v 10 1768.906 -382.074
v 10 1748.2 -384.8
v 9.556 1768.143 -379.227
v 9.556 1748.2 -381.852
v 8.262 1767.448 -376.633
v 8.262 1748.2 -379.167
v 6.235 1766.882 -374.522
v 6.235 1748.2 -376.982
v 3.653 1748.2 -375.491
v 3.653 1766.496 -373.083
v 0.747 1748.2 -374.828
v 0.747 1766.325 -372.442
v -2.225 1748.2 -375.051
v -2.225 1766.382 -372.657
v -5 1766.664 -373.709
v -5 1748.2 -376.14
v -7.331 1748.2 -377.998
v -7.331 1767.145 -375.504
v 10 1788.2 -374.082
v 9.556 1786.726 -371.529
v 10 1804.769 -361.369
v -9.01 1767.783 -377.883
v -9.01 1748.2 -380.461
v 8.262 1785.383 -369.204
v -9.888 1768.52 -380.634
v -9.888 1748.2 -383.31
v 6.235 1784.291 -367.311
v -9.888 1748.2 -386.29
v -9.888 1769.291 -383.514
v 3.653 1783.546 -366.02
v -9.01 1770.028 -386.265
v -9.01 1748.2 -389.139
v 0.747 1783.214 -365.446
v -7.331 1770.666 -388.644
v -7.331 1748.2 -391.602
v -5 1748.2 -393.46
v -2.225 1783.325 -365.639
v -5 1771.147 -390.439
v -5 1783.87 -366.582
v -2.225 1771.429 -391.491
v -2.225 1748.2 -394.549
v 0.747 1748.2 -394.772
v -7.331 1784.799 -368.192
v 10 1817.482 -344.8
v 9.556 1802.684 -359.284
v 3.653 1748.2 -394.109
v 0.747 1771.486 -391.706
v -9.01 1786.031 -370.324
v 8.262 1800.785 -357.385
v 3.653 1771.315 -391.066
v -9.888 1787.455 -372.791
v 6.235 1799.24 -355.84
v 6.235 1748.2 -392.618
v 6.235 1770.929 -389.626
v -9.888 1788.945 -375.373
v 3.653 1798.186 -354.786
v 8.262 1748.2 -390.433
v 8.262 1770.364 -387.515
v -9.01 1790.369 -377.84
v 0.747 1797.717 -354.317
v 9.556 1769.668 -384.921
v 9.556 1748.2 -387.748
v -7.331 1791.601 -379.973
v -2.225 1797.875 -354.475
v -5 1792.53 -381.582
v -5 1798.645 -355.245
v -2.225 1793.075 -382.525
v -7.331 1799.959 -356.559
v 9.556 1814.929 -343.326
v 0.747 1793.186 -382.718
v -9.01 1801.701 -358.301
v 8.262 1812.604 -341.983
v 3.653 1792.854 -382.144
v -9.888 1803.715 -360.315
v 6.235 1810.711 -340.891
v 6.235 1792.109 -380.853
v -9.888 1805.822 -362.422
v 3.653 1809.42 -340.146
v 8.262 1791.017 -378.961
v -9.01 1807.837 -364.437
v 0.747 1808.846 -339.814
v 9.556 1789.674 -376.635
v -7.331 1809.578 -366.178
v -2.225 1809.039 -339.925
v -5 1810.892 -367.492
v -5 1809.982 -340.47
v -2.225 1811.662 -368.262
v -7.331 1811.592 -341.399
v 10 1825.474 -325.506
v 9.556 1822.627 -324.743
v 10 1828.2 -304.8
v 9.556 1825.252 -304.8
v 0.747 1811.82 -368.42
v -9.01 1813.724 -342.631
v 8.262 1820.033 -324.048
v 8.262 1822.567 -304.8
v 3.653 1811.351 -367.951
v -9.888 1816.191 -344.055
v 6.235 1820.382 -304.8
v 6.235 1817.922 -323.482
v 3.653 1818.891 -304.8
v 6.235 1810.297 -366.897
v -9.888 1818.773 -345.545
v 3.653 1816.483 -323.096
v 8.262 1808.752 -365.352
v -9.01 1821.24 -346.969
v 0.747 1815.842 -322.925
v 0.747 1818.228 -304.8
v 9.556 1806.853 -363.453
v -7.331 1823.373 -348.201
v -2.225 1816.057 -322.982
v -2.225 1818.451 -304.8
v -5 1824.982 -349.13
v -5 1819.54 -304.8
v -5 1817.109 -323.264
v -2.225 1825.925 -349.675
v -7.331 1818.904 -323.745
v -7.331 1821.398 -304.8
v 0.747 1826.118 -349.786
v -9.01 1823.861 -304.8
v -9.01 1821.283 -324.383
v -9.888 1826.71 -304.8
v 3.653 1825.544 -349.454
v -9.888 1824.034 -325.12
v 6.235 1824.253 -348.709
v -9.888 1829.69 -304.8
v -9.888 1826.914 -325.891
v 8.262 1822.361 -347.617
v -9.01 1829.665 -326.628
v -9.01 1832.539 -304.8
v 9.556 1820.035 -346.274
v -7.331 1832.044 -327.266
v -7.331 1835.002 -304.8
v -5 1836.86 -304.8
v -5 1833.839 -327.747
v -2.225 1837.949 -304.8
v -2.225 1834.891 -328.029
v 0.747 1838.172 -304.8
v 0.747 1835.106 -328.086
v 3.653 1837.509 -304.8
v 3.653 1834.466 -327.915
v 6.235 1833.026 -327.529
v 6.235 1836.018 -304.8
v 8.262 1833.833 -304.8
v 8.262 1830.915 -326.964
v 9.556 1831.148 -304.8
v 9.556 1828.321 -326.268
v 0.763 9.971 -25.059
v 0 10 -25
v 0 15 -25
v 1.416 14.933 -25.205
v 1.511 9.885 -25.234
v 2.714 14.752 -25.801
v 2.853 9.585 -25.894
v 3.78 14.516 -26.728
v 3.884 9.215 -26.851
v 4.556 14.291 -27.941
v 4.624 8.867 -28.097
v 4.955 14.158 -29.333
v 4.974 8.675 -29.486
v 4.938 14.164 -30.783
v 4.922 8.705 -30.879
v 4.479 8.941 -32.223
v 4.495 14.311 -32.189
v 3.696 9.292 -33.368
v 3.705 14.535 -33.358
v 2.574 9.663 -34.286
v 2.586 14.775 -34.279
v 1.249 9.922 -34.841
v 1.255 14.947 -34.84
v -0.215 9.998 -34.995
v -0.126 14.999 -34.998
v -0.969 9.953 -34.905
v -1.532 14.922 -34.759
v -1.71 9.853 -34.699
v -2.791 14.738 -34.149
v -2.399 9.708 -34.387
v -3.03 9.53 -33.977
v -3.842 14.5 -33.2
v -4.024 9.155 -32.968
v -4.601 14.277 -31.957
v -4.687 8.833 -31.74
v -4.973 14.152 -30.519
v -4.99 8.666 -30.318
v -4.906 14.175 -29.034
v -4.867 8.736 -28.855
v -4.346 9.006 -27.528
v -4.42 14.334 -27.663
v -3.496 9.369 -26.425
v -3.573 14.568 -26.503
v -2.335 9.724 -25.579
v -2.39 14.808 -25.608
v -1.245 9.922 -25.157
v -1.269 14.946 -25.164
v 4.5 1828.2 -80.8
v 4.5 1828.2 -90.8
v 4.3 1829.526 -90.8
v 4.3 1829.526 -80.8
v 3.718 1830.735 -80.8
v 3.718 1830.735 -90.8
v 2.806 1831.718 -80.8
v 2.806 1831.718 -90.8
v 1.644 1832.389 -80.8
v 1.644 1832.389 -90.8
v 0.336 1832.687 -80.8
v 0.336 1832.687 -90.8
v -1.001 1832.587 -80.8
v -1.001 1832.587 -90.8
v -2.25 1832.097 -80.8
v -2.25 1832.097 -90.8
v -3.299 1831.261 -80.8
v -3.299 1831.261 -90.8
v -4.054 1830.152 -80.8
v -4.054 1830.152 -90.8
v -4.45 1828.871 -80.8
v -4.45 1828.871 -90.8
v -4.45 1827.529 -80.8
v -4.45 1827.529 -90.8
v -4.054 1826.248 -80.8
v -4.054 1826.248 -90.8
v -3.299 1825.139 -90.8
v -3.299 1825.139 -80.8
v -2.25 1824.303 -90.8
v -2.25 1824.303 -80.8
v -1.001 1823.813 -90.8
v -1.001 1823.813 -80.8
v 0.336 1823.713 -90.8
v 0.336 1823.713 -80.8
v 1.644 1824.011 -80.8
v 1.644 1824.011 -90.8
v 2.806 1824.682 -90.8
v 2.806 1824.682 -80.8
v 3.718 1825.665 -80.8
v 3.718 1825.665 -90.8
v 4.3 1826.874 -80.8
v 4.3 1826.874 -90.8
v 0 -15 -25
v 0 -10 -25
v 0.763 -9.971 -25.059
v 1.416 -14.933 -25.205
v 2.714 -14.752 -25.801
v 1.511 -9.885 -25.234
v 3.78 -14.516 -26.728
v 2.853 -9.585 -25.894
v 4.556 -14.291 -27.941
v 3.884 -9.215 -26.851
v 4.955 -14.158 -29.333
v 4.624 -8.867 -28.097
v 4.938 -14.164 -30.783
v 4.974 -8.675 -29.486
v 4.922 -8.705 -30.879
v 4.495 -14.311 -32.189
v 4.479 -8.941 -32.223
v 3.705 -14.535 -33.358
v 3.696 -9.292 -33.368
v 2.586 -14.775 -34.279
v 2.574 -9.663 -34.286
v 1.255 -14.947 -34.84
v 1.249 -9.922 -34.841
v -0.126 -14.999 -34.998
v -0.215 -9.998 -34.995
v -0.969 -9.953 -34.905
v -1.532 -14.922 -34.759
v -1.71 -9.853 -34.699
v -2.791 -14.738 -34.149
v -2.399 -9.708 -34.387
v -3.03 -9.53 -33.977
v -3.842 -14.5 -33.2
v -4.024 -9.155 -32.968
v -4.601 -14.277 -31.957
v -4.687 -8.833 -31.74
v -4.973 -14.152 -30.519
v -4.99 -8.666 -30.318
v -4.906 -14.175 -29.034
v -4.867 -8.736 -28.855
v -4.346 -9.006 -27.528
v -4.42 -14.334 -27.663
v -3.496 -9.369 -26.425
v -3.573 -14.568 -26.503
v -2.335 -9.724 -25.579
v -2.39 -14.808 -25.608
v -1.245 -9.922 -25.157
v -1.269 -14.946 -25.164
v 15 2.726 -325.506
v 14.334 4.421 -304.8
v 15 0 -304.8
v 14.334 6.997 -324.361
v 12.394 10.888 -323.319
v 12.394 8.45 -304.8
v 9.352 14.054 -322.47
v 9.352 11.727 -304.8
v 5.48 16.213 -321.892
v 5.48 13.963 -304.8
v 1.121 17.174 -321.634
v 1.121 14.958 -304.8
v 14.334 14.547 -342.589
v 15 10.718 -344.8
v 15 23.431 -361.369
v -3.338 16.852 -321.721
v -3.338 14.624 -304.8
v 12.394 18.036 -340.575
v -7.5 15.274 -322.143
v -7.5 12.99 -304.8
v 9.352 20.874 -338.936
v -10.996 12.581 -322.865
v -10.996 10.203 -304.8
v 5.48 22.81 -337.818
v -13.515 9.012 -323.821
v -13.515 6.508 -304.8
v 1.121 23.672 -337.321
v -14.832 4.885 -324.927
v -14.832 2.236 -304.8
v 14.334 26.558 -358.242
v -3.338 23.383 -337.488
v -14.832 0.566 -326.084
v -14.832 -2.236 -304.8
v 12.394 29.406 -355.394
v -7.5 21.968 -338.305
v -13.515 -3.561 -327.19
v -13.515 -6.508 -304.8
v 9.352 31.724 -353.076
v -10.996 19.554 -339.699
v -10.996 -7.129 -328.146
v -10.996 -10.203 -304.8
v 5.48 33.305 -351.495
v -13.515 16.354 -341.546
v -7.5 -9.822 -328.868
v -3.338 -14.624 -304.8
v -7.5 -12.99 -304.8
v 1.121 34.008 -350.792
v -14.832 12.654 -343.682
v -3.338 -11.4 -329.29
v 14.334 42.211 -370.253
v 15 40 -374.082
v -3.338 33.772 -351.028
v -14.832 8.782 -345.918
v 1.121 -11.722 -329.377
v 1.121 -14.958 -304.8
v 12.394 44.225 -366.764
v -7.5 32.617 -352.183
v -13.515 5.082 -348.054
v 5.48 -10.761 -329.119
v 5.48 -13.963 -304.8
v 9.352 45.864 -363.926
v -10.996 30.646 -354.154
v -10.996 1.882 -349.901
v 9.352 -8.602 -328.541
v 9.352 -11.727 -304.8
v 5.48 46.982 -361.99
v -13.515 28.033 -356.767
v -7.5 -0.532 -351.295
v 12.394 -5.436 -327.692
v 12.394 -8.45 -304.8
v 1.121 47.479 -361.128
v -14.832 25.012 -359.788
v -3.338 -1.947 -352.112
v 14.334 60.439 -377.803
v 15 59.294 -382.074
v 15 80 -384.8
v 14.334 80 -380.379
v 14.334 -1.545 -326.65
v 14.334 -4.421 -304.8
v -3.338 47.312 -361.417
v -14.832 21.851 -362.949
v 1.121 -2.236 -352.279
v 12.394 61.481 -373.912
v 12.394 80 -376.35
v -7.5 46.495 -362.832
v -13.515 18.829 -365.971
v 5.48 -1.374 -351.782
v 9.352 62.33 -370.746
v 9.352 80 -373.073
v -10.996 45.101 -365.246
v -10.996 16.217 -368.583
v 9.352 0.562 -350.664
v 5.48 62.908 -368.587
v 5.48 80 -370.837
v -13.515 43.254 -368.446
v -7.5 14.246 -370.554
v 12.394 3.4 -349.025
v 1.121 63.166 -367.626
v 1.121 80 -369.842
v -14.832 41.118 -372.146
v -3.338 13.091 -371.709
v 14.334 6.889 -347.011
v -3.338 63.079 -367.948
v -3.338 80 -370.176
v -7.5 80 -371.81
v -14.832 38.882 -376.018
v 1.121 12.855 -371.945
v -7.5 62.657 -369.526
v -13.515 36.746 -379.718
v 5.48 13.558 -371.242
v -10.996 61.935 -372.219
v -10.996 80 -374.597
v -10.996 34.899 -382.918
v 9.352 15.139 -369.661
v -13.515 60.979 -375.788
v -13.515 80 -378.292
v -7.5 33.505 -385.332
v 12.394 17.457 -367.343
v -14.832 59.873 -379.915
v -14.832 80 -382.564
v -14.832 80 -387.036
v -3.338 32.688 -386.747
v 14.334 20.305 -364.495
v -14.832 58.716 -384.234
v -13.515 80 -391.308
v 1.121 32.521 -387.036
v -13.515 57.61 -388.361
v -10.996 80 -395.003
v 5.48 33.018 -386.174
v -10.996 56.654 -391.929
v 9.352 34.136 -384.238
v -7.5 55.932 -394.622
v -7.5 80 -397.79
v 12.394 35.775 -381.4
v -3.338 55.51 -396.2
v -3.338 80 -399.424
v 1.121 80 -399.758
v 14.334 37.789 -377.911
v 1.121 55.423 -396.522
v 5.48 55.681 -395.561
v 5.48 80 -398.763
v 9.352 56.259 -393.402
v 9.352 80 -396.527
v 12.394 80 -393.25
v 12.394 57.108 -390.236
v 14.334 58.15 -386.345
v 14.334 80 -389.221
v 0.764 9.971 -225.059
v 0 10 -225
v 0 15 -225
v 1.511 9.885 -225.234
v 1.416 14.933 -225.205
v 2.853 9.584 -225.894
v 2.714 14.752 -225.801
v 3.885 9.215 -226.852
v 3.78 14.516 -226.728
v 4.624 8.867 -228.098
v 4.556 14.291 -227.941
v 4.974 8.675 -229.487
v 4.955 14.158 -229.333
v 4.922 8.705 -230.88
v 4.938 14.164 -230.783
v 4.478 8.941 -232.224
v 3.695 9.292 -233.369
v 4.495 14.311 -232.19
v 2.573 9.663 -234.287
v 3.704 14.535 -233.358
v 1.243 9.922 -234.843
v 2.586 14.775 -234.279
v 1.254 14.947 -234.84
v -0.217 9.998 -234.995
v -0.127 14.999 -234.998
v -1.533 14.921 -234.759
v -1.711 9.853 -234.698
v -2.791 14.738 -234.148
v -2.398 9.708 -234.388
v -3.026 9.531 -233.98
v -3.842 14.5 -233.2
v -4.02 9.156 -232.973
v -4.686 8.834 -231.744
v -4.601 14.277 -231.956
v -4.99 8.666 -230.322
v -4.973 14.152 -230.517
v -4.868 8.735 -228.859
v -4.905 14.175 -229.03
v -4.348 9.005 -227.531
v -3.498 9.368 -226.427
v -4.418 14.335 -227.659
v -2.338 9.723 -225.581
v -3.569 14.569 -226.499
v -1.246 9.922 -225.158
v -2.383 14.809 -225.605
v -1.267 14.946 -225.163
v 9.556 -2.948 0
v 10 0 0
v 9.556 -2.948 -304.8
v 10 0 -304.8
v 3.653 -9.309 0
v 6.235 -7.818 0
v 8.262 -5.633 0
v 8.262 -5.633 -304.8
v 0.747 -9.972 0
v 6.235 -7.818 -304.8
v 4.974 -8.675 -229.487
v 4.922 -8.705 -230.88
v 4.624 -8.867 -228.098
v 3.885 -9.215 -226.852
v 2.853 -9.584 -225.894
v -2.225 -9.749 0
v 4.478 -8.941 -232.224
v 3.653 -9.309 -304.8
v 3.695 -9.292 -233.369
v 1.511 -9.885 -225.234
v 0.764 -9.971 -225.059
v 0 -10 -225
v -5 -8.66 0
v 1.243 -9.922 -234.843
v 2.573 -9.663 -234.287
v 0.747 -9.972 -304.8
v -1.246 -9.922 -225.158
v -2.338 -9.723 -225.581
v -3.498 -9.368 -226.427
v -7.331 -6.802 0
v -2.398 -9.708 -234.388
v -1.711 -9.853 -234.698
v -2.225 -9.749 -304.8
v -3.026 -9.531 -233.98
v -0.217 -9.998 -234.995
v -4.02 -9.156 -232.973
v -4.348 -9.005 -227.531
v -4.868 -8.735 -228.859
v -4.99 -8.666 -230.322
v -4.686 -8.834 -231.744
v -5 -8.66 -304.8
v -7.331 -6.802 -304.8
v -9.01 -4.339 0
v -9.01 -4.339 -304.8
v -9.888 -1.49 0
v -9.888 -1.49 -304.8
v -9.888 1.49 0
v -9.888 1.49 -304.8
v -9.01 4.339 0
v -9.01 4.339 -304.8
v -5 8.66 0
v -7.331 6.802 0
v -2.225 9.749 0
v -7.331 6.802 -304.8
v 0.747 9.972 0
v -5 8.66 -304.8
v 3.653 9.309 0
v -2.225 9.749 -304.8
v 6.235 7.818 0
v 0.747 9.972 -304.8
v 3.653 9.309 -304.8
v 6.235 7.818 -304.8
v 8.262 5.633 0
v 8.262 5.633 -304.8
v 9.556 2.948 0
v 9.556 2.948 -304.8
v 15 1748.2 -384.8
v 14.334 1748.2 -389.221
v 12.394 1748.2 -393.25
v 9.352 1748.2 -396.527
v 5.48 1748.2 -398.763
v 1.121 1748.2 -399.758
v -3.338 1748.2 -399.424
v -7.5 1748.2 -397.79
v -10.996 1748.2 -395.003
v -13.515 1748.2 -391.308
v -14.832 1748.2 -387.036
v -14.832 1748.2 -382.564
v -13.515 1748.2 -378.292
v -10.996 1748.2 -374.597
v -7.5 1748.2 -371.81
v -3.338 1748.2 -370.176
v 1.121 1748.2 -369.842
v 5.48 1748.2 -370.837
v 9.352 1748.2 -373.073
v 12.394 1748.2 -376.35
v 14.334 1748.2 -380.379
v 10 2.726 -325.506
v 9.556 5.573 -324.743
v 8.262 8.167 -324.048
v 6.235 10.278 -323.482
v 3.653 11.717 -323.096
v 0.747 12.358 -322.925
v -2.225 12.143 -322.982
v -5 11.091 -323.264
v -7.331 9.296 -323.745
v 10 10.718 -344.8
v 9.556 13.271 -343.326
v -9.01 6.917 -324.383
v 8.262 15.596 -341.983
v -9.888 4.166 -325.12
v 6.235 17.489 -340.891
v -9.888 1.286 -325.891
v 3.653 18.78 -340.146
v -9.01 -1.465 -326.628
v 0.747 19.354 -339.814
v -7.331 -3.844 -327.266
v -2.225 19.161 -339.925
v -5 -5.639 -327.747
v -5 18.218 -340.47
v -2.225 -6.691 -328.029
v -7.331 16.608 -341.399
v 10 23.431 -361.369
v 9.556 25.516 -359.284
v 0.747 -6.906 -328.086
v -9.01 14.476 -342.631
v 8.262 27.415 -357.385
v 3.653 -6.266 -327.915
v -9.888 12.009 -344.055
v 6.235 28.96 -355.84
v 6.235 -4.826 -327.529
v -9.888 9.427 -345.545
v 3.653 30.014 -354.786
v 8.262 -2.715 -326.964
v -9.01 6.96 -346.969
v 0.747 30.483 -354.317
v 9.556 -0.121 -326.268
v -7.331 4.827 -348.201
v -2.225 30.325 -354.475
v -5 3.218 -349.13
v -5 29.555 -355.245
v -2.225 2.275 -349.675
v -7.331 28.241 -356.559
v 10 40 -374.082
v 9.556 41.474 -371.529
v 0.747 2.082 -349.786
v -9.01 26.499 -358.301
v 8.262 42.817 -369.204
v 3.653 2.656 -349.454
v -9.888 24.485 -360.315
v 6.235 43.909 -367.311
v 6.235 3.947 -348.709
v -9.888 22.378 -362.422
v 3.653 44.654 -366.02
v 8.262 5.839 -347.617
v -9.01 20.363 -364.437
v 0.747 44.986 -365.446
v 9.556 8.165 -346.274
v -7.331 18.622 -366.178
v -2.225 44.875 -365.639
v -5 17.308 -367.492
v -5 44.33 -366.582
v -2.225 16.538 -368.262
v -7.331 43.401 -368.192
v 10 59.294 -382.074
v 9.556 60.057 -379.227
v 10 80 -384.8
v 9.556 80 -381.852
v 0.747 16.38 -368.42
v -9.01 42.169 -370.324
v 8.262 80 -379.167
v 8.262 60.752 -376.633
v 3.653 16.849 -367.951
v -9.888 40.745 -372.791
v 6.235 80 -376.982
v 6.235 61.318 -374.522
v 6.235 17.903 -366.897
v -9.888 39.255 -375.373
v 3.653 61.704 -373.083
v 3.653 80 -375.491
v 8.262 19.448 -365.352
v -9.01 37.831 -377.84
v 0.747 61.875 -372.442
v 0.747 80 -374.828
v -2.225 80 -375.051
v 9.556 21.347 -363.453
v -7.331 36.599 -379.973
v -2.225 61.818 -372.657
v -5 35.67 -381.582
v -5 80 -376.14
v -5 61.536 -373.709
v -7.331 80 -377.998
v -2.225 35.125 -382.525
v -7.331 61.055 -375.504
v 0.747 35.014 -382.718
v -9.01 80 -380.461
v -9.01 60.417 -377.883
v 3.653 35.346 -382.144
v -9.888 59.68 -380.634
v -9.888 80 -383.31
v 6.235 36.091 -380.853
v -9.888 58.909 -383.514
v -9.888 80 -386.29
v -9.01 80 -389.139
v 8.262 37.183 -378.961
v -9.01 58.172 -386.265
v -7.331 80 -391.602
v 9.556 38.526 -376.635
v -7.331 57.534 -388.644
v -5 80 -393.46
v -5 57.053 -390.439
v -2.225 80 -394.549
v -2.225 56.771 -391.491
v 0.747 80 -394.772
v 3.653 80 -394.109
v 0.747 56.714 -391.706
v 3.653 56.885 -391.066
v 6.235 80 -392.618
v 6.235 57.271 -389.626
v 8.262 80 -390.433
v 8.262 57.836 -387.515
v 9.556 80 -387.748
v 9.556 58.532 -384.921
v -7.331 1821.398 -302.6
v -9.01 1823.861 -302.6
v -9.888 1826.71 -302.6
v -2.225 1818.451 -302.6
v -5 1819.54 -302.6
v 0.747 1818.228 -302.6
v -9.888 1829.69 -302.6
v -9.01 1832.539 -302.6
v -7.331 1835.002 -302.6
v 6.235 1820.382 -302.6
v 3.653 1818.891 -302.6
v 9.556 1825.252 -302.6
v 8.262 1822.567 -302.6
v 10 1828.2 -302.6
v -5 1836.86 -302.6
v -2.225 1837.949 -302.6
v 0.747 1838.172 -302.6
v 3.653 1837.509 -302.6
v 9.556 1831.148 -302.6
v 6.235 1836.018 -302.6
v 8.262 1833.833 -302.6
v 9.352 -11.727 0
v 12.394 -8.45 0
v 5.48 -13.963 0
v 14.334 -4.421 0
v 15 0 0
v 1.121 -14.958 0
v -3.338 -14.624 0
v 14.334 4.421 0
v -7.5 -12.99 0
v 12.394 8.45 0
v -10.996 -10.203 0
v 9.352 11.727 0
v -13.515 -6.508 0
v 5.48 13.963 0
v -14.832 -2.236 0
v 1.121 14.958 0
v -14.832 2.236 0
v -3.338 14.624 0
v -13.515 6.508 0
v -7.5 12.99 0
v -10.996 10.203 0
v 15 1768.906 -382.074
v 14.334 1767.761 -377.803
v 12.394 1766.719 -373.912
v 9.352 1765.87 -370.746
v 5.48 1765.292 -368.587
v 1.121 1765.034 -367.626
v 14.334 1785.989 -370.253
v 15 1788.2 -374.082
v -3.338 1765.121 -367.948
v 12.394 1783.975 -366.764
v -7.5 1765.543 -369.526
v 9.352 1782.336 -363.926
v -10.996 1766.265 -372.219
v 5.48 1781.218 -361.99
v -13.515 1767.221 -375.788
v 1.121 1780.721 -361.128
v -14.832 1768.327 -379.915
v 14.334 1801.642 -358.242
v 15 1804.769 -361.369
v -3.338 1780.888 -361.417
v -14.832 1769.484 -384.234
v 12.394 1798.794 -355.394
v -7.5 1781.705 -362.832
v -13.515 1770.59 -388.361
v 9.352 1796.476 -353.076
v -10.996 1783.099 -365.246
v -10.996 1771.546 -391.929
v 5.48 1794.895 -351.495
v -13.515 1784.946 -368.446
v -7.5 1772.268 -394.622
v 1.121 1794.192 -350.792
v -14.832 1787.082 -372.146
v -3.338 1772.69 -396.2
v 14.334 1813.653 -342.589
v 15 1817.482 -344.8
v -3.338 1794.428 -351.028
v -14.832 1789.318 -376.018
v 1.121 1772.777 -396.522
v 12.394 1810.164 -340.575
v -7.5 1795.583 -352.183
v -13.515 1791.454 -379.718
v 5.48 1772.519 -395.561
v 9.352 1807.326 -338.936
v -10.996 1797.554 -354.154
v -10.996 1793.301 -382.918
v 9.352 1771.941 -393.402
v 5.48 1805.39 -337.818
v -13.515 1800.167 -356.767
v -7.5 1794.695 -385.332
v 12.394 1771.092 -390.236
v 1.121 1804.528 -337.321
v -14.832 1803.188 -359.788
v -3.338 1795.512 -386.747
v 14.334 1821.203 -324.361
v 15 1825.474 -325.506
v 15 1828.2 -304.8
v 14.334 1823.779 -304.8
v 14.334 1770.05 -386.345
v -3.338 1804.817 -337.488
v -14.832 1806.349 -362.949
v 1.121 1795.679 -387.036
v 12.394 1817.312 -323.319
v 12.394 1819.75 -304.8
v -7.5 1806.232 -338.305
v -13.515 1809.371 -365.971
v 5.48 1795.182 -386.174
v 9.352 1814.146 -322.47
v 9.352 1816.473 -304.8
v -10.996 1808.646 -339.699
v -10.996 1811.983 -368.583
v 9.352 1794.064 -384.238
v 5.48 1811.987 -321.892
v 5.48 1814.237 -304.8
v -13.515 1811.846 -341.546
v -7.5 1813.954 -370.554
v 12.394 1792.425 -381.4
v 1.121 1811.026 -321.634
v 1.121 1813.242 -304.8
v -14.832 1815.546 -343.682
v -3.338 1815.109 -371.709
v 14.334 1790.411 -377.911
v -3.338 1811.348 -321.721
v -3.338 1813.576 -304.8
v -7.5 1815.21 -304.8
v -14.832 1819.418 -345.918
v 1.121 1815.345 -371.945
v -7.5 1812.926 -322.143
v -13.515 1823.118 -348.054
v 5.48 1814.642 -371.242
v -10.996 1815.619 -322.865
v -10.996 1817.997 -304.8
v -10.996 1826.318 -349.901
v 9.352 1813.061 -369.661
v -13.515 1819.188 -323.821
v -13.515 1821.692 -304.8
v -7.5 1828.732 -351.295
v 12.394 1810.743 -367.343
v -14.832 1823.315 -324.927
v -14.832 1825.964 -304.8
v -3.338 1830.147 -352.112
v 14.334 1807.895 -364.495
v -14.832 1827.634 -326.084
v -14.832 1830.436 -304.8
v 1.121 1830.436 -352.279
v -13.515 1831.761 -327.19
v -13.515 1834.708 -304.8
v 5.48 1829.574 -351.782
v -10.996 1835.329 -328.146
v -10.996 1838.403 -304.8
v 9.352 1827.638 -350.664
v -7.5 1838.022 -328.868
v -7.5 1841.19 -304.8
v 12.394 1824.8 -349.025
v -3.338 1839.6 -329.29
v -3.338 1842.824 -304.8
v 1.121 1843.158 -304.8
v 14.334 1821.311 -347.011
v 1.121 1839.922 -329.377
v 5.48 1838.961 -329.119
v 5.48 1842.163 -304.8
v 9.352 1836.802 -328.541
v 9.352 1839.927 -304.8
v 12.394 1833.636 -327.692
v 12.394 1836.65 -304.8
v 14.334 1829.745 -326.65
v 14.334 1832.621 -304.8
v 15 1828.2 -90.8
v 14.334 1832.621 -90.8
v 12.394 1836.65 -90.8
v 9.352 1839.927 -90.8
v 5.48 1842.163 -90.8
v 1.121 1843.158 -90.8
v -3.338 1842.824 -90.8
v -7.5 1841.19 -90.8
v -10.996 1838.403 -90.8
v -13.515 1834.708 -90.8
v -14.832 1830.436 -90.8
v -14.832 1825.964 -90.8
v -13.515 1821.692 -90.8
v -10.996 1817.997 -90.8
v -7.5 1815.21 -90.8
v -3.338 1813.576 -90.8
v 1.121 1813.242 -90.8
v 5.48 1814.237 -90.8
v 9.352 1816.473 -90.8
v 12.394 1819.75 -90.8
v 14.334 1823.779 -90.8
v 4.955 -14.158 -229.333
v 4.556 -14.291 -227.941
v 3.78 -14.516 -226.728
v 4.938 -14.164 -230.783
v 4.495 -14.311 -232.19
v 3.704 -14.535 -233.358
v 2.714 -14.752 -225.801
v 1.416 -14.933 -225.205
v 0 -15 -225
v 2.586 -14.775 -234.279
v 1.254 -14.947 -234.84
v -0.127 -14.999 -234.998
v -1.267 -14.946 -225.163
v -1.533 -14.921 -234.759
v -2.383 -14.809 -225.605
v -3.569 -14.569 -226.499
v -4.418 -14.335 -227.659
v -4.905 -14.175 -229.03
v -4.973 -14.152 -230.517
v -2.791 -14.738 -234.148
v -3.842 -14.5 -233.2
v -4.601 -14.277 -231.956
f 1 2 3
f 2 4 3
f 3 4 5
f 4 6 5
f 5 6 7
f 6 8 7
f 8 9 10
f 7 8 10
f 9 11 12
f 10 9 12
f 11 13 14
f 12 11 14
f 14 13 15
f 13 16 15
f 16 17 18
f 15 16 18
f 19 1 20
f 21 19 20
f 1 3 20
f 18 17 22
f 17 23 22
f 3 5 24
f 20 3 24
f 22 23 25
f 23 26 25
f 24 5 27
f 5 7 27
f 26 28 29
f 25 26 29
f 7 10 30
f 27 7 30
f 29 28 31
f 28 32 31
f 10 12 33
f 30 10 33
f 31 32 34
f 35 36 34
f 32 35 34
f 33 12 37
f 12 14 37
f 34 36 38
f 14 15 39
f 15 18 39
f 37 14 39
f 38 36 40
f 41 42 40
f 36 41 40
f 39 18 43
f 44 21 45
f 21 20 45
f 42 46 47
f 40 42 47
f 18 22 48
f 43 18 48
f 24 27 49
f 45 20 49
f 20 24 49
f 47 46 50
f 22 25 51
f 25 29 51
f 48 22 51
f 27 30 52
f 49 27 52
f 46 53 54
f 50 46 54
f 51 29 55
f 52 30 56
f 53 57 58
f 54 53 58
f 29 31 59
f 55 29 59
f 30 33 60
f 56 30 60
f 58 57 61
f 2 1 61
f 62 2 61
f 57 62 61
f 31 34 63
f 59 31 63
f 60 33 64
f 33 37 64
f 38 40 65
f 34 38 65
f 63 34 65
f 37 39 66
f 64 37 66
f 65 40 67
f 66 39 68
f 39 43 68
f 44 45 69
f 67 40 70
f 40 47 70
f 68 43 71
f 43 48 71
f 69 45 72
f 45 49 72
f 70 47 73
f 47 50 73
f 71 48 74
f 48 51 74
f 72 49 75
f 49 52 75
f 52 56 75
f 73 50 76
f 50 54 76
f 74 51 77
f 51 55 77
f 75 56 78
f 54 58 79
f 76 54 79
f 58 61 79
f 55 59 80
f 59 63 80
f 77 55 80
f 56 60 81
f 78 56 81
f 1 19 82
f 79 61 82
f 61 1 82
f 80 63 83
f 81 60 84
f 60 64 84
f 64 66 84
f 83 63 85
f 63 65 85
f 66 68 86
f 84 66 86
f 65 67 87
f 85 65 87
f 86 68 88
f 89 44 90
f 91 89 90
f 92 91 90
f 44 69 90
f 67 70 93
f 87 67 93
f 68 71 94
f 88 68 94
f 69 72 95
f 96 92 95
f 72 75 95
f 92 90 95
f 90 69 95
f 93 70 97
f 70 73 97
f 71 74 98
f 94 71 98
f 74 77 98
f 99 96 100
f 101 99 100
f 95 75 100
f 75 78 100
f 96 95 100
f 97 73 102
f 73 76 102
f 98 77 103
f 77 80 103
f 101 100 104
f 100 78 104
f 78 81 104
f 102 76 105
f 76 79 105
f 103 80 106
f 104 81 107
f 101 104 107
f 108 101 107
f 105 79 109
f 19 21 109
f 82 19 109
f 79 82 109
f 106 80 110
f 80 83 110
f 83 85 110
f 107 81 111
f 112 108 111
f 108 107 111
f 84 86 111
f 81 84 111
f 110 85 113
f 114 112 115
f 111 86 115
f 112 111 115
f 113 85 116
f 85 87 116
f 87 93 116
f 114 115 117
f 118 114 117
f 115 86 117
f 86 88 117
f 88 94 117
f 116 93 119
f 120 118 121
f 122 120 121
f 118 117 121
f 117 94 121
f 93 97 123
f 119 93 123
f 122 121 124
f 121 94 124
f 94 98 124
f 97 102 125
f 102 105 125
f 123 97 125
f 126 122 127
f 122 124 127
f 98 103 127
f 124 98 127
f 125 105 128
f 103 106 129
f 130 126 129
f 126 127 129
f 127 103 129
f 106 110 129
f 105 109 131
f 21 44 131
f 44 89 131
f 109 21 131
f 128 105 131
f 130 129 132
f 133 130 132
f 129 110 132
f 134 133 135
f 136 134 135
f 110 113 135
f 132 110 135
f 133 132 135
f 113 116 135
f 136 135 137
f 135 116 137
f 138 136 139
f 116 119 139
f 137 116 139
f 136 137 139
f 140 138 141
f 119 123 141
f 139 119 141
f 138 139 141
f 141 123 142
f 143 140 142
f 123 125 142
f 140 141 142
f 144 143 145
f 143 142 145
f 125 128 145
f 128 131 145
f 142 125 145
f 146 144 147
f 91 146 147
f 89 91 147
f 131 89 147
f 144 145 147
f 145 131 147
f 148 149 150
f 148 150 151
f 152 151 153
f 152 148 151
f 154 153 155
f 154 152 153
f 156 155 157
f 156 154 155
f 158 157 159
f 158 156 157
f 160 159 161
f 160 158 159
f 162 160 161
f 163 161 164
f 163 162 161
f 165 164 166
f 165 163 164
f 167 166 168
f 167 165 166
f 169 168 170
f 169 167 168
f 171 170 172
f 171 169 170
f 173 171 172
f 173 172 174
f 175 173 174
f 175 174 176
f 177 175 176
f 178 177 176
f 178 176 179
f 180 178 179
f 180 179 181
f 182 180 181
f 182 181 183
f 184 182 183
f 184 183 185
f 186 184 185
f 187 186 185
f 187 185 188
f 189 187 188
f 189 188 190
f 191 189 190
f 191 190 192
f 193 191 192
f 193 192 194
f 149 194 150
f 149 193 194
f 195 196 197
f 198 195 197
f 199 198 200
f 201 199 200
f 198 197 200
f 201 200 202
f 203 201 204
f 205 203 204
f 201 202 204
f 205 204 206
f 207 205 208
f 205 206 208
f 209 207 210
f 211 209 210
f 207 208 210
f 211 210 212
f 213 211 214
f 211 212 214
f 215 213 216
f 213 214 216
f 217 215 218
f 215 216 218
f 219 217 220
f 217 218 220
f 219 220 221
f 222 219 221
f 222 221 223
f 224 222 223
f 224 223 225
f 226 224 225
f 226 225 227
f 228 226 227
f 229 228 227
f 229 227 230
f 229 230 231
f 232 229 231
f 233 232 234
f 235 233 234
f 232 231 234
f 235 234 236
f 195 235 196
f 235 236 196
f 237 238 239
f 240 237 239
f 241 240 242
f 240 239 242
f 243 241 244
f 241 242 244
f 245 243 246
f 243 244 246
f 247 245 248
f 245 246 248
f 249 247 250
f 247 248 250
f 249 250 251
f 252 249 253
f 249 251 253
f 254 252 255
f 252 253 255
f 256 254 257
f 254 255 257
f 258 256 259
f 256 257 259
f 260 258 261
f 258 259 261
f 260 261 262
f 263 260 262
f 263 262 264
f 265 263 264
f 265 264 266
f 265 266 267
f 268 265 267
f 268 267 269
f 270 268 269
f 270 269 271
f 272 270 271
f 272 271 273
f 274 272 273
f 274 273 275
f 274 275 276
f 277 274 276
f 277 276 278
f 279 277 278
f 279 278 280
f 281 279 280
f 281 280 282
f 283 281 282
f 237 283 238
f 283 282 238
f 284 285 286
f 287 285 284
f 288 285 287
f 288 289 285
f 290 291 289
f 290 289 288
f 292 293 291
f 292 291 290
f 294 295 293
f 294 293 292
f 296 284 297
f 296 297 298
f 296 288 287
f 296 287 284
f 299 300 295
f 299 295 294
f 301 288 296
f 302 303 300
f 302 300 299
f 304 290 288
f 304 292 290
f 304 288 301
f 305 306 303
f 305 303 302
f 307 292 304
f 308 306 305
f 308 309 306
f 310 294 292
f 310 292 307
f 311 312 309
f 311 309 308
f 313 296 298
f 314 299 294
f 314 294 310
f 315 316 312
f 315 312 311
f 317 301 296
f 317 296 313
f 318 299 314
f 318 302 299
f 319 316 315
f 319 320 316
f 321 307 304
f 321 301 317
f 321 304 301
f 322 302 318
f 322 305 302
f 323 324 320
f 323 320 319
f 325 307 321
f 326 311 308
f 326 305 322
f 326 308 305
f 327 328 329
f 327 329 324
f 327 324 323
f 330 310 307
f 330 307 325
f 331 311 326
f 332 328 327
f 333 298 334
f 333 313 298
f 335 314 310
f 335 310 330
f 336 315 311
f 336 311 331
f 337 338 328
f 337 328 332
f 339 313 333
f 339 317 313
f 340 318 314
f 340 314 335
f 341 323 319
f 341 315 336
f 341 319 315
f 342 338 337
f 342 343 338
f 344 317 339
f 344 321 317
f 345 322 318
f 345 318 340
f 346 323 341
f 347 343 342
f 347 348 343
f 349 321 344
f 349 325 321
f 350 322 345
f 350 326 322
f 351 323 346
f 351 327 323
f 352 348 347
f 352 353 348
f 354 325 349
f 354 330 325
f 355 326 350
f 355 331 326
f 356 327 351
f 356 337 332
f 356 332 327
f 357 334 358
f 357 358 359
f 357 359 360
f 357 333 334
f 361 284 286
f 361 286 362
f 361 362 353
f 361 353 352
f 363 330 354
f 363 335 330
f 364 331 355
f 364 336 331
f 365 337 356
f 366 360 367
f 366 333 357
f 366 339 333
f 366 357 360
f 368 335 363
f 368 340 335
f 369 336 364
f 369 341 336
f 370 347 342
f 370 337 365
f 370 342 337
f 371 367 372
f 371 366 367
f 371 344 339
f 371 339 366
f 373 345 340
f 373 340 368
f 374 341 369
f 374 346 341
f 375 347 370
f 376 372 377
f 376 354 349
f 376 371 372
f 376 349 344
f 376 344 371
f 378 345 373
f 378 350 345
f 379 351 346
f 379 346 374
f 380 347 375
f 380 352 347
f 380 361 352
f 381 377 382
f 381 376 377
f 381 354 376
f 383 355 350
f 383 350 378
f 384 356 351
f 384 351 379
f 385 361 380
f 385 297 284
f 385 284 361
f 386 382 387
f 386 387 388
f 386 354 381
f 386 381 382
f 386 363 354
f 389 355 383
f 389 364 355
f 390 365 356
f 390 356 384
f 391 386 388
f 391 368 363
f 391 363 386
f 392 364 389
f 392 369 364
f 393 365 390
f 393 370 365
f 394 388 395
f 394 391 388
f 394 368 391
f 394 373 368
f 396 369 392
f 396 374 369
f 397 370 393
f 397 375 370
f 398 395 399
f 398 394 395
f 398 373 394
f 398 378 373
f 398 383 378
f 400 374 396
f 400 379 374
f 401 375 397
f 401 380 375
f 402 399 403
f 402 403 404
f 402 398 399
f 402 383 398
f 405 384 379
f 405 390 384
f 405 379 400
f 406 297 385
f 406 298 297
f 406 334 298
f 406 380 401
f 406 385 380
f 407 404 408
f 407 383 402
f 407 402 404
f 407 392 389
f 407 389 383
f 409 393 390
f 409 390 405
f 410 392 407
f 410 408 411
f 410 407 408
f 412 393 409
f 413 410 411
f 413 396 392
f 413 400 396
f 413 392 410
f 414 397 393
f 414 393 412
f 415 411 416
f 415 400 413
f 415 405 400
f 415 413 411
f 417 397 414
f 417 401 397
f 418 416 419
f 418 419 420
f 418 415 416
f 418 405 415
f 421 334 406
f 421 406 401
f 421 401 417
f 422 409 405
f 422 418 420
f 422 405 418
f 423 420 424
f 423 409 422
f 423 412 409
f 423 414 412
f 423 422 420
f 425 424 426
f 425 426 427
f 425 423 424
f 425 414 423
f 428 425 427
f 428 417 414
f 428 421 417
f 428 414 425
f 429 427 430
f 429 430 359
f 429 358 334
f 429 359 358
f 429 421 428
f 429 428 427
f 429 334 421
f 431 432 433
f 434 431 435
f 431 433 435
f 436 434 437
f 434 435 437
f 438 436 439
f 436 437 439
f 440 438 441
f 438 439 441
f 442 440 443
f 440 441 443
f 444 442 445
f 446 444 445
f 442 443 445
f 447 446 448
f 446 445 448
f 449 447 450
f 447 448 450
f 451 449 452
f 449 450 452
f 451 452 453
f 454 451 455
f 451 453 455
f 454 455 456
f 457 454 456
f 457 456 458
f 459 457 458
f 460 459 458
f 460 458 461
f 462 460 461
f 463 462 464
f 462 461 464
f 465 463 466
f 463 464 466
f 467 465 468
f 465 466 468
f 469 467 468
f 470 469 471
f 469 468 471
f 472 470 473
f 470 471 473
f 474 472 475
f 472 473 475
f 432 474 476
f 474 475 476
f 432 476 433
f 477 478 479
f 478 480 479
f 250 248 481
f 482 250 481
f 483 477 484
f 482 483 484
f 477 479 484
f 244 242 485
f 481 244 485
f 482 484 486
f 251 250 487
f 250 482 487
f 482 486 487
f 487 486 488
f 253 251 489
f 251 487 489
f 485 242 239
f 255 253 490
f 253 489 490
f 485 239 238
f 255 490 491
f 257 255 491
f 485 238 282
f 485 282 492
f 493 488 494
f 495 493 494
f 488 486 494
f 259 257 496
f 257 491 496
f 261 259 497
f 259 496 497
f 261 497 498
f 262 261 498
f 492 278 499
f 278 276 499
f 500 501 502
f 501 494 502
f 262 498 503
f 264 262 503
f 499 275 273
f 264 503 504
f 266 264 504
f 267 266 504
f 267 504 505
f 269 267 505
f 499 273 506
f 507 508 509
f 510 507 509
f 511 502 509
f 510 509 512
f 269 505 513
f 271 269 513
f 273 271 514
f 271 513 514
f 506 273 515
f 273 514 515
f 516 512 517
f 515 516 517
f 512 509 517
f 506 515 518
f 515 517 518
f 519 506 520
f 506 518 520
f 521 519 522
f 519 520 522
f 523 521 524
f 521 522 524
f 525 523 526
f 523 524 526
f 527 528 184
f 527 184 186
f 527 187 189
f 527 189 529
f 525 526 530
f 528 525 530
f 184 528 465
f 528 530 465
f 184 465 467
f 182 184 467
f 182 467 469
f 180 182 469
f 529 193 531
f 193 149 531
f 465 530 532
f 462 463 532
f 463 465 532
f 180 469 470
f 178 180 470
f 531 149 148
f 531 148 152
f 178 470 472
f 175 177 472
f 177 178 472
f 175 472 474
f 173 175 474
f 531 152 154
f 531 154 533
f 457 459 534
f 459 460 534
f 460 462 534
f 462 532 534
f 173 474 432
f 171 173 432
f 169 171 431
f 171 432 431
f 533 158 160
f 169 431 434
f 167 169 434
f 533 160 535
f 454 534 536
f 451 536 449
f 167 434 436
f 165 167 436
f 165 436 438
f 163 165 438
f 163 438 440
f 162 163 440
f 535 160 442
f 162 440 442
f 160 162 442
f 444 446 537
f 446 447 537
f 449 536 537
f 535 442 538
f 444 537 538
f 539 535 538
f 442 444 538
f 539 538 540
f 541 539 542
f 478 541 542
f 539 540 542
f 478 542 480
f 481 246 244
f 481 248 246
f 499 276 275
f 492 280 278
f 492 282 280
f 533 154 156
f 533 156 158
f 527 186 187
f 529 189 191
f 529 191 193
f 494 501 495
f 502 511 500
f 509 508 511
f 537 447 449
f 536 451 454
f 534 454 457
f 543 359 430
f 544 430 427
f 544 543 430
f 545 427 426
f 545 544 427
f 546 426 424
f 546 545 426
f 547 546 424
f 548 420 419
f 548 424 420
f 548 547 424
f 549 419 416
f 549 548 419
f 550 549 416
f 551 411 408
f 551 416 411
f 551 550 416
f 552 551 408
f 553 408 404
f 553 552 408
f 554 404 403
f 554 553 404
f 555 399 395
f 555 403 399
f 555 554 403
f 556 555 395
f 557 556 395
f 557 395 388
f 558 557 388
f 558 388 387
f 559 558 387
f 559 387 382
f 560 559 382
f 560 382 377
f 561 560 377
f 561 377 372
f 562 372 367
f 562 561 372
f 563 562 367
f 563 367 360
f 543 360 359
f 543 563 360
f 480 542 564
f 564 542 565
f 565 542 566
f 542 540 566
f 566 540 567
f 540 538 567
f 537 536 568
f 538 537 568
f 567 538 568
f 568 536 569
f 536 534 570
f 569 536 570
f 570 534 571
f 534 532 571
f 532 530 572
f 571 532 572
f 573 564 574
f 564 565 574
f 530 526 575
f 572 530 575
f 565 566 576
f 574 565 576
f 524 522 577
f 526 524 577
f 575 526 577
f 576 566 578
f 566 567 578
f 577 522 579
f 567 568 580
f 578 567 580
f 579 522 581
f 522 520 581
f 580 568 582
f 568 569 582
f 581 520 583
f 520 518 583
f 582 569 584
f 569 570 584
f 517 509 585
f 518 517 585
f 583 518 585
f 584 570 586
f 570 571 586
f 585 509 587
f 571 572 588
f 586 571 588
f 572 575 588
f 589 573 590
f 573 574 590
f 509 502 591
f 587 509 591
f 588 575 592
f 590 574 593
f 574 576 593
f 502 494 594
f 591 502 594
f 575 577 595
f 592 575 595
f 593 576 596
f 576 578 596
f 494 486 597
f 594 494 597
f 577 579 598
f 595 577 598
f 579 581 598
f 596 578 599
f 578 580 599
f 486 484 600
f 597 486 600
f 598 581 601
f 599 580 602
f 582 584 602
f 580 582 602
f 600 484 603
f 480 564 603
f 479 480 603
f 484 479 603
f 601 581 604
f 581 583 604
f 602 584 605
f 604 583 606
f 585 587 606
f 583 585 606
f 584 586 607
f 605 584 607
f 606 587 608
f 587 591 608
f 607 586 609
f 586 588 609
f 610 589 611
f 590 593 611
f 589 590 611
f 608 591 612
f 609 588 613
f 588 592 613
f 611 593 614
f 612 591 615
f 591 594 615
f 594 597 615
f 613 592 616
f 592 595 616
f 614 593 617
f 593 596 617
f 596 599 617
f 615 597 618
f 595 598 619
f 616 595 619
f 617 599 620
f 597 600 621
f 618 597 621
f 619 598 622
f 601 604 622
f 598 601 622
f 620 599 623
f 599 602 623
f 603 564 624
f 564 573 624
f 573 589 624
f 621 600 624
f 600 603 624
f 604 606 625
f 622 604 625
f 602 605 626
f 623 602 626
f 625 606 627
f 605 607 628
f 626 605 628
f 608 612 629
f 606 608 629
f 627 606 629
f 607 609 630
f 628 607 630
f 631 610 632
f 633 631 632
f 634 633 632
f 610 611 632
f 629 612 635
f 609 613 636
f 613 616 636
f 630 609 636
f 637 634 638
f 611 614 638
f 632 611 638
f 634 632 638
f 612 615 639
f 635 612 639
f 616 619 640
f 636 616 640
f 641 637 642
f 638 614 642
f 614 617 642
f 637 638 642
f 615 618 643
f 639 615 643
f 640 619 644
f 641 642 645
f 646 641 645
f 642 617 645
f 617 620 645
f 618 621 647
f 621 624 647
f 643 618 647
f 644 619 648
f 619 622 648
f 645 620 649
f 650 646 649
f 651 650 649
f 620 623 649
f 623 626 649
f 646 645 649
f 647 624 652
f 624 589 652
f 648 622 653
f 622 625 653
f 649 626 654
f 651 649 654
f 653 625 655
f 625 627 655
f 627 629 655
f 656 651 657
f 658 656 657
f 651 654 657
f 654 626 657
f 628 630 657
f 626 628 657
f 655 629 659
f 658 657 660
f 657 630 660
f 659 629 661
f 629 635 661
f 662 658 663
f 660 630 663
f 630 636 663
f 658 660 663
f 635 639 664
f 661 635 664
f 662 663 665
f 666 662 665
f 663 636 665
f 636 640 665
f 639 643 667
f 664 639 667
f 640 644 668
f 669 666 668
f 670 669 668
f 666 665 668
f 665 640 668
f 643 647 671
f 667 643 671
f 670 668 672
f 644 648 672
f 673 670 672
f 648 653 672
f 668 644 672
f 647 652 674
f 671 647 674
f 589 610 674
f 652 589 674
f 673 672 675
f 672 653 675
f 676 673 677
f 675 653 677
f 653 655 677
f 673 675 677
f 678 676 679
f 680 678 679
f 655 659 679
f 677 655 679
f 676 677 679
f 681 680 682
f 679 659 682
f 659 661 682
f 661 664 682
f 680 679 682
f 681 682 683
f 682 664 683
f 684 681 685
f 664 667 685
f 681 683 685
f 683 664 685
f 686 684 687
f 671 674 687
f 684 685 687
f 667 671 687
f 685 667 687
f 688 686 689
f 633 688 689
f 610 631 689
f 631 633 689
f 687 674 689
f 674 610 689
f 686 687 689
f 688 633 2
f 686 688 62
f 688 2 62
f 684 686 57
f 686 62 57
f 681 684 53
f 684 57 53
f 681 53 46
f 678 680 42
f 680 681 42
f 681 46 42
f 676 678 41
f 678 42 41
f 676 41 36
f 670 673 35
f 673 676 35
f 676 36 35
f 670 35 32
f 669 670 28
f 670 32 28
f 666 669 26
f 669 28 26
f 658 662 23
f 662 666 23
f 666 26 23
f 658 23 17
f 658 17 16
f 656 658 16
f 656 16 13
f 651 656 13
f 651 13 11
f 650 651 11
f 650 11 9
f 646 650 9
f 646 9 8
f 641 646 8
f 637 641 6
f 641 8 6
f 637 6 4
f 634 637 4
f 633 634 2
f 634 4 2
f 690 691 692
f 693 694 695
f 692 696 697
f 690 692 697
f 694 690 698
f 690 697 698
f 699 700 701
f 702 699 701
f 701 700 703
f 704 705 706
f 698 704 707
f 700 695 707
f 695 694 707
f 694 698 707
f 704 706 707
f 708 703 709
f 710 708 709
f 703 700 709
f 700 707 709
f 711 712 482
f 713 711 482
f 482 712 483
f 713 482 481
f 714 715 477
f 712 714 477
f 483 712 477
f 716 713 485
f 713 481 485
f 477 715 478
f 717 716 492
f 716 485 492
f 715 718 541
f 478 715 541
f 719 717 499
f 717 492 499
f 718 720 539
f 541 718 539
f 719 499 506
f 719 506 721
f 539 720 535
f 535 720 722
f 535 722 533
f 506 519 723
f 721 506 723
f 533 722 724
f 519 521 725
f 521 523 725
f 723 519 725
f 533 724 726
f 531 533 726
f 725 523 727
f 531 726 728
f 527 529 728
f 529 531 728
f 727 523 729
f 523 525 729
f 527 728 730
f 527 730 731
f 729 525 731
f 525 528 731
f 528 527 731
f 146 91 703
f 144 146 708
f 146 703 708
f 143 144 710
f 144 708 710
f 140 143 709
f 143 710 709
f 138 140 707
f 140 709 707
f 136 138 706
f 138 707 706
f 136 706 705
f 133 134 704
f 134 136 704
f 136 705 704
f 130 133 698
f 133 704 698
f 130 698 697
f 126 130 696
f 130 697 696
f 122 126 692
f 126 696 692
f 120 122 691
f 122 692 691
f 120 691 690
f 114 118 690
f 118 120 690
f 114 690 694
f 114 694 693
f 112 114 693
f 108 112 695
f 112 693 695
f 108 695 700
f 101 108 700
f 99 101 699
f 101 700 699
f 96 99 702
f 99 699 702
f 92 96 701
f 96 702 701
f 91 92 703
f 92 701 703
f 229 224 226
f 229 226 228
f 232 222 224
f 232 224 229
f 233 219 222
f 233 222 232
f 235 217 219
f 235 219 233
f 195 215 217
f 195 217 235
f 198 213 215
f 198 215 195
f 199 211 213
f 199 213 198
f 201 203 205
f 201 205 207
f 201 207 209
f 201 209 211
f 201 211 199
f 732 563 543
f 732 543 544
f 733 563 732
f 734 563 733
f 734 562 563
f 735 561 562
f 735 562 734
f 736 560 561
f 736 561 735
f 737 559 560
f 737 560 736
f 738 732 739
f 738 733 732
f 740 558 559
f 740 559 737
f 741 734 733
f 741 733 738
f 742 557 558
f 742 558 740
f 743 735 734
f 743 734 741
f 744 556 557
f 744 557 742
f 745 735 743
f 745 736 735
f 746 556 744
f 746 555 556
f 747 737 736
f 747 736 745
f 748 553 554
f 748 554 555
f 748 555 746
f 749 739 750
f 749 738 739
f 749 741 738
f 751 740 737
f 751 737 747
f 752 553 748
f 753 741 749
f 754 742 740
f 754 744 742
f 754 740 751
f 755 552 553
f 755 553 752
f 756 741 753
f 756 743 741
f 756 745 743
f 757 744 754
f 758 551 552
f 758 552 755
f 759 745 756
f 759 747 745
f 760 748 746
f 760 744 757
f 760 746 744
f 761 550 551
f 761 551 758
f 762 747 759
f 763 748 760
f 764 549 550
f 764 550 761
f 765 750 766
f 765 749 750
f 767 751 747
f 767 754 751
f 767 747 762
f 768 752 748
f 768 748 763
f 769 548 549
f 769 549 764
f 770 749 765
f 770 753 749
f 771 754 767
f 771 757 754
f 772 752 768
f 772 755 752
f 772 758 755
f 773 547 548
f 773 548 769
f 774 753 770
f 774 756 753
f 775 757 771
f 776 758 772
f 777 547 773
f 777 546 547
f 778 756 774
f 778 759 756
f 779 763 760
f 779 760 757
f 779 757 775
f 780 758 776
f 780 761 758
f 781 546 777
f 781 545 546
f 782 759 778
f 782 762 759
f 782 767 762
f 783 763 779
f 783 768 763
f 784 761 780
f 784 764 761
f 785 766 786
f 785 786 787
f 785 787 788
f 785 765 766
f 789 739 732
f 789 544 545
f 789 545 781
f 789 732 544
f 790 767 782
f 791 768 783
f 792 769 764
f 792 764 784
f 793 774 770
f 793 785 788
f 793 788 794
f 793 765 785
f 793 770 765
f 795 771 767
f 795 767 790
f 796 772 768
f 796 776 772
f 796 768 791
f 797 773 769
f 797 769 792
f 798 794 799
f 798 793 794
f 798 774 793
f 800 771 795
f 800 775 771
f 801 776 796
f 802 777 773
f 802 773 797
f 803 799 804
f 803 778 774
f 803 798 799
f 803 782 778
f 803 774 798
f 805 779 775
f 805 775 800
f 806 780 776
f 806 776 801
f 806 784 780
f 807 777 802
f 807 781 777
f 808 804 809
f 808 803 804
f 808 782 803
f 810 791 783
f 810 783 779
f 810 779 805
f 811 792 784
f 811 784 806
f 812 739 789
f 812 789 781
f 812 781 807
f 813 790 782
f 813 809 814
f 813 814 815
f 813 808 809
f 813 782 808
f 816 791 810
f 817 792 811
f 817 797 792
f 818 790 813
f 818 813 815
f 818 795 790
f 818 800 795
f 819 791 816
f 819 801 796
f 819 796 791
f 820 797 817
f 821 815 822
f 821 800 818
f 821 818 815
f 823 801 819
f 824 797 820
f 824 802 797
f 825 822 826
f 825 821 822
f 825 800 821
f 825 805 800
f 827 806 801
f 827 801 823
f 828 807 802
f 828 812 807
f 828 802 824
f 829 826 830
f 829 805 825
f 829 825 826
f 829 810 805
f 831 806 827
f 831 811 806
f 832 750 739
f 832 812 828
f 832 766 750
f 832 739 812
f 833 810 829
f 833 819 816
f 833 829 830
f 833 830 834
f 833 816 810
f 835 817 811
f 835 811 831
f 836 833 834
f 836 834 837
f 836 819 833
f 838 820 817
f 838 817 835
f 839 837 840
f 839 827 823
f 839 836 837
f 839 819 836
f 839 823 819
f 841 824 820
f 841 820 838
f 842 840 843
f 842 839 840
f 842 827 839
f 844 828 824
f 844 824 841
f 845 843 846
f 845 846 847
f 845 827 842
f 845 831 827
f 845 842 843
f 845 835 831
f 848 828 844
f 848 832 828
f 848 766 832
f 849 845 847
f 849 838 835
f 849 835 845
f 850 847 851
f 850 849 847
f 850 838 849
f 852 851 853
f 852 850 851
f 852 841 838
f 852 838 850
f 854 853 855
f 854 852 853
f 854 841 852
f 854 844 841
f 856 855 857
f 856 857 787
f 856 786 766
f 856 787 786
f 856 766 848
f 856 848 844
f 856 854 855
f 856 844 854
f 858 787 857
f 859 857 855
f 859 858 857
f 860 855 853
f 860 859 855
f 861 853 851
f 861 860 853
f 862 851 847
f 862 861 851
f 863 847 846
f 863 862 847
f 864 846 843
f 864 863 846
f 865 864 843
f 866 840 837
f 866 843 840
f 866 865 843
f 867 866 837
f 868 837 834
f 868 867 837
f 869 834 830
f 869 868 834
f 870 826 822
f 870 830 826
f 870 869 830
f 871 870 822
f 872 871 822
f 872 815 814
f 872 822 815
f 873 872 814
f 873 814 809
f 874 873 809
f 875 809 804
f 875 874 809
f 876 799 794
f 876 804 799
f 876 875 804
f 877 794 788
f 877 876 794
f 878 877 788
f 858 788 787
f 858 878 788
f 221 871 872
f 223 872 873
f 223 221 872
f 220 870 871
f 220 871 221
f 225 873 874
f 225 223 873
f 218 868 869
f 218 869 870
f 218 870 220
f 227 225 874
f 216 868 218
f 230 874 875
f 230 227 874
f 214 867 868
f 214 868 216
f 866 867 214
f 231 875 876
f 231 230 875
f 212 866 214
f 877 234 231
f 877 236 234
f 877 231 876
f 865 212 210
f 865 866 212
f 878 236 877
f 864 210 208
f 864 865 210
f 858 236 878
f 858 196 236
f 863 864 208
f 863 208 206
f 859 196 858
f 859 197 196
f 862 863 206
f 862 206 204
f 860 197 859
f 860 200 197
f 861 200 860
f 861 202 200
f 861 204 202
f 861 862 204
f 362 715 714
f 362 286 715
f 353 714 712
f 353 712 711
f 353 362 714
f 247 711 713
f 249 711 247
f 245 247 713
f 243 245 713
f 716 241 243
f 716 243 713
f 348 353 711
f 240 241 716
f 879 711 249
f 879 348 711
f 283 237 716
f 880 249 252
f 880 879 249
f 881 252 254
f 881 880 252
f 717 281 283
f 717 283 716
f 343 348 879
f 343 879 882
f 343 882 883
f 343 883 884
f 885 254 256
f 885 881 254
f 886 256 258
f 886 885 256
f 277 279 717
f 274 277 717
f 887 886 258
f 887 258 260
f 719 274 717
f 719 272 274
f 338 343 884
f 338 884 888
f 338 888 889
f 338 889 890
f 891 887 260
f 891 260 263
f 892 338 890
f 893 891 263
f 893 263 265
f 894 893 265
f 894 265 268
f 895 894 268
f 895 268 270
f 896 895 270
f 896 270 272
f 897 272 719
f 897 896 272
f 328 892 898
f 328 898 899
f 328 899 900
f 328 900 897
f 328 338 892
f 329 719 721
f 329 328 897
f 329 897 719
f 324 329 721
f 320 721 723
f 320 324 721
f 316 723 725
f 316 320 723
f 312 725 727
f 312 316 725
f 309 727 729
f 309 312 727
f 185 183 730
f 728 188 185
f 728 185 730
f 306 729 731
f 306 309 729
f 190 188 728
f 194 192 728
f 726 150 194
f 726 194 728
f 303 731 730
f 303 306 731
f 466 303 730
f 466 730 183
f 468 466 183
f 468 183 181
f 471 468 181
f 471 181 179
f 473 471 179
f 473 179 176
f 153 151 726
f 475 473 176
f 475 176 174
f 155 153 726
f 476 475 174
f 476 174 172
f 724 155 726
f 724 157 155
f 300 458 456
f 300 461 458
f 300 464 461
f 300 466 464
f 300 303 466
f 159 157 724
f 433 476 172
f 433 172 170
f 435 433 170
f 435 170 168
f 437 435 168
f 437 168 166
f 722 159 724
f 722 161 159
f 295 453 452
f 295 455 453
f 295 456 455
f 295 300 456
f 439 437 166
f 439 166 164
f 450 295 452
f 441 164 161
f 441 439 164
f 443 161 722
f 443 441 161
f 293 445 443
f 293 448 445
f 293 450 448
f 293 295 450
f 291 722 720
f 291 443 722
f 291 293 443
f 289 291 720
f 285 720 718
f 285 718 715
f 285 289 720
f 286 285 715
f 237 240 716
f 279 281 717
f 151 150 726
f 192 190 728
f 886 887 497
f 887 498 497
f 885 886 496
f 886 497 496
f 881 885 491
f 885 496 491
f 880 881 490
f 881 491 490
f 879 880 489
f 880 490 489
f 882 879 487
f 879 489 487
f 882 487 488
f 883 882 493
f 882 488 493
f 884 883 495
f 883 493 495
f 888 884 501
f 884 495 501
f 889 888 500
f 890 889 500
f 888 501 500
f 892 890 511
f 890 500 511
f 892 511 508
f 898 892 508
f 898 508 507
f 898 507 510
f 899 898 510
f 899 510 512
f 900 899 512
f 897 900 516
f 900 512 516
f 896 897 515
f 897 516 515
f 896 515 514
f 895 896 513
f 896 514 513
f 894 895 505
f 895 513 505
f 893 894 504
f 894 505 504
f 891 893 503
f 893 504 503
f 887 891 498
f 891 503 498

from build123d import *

# Parameters (mm, degrees)
SKETCH2_R           = 15
SKETCH2_R_2         = 10
SKETCH5_R           = 5
CUT_EXTRUDE2_DEPTH  = 158.5
SKETCH6_R           = 30
CUT_EXTRUDE3_DEPTH  = 90.8
SKETCH9_R           = 10
BOSS_EXTRUDE2_DEPTH = 211.8
SKETCH10_R          = 4.5
BOSS_EXTRUDE3_DEPTH = 10


with BuildPart() as part:
    # Sweep2: sweep along a path in Sketch1
    with BuildLine(Plane(origin=(0, 0, 0), x_dir=(0, 0, -1), z_dir=(1, 0, 0))) as sweep2_path:
        Line((0, 0), (304.8, 0))
        ThreePointArc((304.8, 0), (361.368542495, 23.431457505), (384.8, 80))
        Line((384.8, 80), (384.8, 1748.2))
        ThreePointArc((384.8, 1748.2), (361.368542495, 1804.768542495), (304.8, 1828.2))
        Line((304.8, 1828.2), (0, 1828.2))
    # Sketch2 → Sweep2 (sweep)
    with BuildSketch(Plane.XY):
        with Locations((0, 1828.2)):
            Circle(SKETCH2_R)
        with Locations((0, 1828.2)):
            Circle(SKETCH2_R_2, mode=Mode.SUBTRACT)
    sweep(path=sweep2_path.line)

    # Sketch5 → Cut-Extrude2 (cut, symmetric)
    with BuildSketch(Plane(origin=(0, 0, 0), x_dir=(1, 0, 0), z_dir=(0, 1, 0))):
        with Locations(Location((0, 30, 0), (0, 0, 270))):
            Circle(SKETCH5_R)
        with Locations(Location((0, 230, 0), (0, 0, 270))):
            Circle(SKETCH5_R)
    extrude(amount=CUT_EXTRUDE2_DEPTH, both=True, mode=Mode.SUBTRACT)

    # Sketch6 → Cut-Extrude3 (cut)
    with BuildSketch(Plane.XY):
        with Locations((0, 1828.2)):
            Circle(SKETCH6_R)
    extrude(amount=-CUT_EXTRUDE3_DEPTH, mode=Mode.SUBTRACT)

    # Sketch9 → Boss-Extrude2 (add)
    with BuildSketch(Plane.XY.offset(-90.8)):
        with Locations((0, 1828.2)):
            Circle(SKETCH9_R)
    extrude(amount=-BOSS_EXTRUDE2_DEPTH)

    # Sketch10 → Boss-Extrude3 (add)
    with BuildSketch(Plane.XY.offset(-90.8)):
        with Locations((0, 1828.2)):
            Circle(SKETCH10_R)
    extrude(amount=BOSS_EXTRUDE3_DEPTH)


solid = part.part
